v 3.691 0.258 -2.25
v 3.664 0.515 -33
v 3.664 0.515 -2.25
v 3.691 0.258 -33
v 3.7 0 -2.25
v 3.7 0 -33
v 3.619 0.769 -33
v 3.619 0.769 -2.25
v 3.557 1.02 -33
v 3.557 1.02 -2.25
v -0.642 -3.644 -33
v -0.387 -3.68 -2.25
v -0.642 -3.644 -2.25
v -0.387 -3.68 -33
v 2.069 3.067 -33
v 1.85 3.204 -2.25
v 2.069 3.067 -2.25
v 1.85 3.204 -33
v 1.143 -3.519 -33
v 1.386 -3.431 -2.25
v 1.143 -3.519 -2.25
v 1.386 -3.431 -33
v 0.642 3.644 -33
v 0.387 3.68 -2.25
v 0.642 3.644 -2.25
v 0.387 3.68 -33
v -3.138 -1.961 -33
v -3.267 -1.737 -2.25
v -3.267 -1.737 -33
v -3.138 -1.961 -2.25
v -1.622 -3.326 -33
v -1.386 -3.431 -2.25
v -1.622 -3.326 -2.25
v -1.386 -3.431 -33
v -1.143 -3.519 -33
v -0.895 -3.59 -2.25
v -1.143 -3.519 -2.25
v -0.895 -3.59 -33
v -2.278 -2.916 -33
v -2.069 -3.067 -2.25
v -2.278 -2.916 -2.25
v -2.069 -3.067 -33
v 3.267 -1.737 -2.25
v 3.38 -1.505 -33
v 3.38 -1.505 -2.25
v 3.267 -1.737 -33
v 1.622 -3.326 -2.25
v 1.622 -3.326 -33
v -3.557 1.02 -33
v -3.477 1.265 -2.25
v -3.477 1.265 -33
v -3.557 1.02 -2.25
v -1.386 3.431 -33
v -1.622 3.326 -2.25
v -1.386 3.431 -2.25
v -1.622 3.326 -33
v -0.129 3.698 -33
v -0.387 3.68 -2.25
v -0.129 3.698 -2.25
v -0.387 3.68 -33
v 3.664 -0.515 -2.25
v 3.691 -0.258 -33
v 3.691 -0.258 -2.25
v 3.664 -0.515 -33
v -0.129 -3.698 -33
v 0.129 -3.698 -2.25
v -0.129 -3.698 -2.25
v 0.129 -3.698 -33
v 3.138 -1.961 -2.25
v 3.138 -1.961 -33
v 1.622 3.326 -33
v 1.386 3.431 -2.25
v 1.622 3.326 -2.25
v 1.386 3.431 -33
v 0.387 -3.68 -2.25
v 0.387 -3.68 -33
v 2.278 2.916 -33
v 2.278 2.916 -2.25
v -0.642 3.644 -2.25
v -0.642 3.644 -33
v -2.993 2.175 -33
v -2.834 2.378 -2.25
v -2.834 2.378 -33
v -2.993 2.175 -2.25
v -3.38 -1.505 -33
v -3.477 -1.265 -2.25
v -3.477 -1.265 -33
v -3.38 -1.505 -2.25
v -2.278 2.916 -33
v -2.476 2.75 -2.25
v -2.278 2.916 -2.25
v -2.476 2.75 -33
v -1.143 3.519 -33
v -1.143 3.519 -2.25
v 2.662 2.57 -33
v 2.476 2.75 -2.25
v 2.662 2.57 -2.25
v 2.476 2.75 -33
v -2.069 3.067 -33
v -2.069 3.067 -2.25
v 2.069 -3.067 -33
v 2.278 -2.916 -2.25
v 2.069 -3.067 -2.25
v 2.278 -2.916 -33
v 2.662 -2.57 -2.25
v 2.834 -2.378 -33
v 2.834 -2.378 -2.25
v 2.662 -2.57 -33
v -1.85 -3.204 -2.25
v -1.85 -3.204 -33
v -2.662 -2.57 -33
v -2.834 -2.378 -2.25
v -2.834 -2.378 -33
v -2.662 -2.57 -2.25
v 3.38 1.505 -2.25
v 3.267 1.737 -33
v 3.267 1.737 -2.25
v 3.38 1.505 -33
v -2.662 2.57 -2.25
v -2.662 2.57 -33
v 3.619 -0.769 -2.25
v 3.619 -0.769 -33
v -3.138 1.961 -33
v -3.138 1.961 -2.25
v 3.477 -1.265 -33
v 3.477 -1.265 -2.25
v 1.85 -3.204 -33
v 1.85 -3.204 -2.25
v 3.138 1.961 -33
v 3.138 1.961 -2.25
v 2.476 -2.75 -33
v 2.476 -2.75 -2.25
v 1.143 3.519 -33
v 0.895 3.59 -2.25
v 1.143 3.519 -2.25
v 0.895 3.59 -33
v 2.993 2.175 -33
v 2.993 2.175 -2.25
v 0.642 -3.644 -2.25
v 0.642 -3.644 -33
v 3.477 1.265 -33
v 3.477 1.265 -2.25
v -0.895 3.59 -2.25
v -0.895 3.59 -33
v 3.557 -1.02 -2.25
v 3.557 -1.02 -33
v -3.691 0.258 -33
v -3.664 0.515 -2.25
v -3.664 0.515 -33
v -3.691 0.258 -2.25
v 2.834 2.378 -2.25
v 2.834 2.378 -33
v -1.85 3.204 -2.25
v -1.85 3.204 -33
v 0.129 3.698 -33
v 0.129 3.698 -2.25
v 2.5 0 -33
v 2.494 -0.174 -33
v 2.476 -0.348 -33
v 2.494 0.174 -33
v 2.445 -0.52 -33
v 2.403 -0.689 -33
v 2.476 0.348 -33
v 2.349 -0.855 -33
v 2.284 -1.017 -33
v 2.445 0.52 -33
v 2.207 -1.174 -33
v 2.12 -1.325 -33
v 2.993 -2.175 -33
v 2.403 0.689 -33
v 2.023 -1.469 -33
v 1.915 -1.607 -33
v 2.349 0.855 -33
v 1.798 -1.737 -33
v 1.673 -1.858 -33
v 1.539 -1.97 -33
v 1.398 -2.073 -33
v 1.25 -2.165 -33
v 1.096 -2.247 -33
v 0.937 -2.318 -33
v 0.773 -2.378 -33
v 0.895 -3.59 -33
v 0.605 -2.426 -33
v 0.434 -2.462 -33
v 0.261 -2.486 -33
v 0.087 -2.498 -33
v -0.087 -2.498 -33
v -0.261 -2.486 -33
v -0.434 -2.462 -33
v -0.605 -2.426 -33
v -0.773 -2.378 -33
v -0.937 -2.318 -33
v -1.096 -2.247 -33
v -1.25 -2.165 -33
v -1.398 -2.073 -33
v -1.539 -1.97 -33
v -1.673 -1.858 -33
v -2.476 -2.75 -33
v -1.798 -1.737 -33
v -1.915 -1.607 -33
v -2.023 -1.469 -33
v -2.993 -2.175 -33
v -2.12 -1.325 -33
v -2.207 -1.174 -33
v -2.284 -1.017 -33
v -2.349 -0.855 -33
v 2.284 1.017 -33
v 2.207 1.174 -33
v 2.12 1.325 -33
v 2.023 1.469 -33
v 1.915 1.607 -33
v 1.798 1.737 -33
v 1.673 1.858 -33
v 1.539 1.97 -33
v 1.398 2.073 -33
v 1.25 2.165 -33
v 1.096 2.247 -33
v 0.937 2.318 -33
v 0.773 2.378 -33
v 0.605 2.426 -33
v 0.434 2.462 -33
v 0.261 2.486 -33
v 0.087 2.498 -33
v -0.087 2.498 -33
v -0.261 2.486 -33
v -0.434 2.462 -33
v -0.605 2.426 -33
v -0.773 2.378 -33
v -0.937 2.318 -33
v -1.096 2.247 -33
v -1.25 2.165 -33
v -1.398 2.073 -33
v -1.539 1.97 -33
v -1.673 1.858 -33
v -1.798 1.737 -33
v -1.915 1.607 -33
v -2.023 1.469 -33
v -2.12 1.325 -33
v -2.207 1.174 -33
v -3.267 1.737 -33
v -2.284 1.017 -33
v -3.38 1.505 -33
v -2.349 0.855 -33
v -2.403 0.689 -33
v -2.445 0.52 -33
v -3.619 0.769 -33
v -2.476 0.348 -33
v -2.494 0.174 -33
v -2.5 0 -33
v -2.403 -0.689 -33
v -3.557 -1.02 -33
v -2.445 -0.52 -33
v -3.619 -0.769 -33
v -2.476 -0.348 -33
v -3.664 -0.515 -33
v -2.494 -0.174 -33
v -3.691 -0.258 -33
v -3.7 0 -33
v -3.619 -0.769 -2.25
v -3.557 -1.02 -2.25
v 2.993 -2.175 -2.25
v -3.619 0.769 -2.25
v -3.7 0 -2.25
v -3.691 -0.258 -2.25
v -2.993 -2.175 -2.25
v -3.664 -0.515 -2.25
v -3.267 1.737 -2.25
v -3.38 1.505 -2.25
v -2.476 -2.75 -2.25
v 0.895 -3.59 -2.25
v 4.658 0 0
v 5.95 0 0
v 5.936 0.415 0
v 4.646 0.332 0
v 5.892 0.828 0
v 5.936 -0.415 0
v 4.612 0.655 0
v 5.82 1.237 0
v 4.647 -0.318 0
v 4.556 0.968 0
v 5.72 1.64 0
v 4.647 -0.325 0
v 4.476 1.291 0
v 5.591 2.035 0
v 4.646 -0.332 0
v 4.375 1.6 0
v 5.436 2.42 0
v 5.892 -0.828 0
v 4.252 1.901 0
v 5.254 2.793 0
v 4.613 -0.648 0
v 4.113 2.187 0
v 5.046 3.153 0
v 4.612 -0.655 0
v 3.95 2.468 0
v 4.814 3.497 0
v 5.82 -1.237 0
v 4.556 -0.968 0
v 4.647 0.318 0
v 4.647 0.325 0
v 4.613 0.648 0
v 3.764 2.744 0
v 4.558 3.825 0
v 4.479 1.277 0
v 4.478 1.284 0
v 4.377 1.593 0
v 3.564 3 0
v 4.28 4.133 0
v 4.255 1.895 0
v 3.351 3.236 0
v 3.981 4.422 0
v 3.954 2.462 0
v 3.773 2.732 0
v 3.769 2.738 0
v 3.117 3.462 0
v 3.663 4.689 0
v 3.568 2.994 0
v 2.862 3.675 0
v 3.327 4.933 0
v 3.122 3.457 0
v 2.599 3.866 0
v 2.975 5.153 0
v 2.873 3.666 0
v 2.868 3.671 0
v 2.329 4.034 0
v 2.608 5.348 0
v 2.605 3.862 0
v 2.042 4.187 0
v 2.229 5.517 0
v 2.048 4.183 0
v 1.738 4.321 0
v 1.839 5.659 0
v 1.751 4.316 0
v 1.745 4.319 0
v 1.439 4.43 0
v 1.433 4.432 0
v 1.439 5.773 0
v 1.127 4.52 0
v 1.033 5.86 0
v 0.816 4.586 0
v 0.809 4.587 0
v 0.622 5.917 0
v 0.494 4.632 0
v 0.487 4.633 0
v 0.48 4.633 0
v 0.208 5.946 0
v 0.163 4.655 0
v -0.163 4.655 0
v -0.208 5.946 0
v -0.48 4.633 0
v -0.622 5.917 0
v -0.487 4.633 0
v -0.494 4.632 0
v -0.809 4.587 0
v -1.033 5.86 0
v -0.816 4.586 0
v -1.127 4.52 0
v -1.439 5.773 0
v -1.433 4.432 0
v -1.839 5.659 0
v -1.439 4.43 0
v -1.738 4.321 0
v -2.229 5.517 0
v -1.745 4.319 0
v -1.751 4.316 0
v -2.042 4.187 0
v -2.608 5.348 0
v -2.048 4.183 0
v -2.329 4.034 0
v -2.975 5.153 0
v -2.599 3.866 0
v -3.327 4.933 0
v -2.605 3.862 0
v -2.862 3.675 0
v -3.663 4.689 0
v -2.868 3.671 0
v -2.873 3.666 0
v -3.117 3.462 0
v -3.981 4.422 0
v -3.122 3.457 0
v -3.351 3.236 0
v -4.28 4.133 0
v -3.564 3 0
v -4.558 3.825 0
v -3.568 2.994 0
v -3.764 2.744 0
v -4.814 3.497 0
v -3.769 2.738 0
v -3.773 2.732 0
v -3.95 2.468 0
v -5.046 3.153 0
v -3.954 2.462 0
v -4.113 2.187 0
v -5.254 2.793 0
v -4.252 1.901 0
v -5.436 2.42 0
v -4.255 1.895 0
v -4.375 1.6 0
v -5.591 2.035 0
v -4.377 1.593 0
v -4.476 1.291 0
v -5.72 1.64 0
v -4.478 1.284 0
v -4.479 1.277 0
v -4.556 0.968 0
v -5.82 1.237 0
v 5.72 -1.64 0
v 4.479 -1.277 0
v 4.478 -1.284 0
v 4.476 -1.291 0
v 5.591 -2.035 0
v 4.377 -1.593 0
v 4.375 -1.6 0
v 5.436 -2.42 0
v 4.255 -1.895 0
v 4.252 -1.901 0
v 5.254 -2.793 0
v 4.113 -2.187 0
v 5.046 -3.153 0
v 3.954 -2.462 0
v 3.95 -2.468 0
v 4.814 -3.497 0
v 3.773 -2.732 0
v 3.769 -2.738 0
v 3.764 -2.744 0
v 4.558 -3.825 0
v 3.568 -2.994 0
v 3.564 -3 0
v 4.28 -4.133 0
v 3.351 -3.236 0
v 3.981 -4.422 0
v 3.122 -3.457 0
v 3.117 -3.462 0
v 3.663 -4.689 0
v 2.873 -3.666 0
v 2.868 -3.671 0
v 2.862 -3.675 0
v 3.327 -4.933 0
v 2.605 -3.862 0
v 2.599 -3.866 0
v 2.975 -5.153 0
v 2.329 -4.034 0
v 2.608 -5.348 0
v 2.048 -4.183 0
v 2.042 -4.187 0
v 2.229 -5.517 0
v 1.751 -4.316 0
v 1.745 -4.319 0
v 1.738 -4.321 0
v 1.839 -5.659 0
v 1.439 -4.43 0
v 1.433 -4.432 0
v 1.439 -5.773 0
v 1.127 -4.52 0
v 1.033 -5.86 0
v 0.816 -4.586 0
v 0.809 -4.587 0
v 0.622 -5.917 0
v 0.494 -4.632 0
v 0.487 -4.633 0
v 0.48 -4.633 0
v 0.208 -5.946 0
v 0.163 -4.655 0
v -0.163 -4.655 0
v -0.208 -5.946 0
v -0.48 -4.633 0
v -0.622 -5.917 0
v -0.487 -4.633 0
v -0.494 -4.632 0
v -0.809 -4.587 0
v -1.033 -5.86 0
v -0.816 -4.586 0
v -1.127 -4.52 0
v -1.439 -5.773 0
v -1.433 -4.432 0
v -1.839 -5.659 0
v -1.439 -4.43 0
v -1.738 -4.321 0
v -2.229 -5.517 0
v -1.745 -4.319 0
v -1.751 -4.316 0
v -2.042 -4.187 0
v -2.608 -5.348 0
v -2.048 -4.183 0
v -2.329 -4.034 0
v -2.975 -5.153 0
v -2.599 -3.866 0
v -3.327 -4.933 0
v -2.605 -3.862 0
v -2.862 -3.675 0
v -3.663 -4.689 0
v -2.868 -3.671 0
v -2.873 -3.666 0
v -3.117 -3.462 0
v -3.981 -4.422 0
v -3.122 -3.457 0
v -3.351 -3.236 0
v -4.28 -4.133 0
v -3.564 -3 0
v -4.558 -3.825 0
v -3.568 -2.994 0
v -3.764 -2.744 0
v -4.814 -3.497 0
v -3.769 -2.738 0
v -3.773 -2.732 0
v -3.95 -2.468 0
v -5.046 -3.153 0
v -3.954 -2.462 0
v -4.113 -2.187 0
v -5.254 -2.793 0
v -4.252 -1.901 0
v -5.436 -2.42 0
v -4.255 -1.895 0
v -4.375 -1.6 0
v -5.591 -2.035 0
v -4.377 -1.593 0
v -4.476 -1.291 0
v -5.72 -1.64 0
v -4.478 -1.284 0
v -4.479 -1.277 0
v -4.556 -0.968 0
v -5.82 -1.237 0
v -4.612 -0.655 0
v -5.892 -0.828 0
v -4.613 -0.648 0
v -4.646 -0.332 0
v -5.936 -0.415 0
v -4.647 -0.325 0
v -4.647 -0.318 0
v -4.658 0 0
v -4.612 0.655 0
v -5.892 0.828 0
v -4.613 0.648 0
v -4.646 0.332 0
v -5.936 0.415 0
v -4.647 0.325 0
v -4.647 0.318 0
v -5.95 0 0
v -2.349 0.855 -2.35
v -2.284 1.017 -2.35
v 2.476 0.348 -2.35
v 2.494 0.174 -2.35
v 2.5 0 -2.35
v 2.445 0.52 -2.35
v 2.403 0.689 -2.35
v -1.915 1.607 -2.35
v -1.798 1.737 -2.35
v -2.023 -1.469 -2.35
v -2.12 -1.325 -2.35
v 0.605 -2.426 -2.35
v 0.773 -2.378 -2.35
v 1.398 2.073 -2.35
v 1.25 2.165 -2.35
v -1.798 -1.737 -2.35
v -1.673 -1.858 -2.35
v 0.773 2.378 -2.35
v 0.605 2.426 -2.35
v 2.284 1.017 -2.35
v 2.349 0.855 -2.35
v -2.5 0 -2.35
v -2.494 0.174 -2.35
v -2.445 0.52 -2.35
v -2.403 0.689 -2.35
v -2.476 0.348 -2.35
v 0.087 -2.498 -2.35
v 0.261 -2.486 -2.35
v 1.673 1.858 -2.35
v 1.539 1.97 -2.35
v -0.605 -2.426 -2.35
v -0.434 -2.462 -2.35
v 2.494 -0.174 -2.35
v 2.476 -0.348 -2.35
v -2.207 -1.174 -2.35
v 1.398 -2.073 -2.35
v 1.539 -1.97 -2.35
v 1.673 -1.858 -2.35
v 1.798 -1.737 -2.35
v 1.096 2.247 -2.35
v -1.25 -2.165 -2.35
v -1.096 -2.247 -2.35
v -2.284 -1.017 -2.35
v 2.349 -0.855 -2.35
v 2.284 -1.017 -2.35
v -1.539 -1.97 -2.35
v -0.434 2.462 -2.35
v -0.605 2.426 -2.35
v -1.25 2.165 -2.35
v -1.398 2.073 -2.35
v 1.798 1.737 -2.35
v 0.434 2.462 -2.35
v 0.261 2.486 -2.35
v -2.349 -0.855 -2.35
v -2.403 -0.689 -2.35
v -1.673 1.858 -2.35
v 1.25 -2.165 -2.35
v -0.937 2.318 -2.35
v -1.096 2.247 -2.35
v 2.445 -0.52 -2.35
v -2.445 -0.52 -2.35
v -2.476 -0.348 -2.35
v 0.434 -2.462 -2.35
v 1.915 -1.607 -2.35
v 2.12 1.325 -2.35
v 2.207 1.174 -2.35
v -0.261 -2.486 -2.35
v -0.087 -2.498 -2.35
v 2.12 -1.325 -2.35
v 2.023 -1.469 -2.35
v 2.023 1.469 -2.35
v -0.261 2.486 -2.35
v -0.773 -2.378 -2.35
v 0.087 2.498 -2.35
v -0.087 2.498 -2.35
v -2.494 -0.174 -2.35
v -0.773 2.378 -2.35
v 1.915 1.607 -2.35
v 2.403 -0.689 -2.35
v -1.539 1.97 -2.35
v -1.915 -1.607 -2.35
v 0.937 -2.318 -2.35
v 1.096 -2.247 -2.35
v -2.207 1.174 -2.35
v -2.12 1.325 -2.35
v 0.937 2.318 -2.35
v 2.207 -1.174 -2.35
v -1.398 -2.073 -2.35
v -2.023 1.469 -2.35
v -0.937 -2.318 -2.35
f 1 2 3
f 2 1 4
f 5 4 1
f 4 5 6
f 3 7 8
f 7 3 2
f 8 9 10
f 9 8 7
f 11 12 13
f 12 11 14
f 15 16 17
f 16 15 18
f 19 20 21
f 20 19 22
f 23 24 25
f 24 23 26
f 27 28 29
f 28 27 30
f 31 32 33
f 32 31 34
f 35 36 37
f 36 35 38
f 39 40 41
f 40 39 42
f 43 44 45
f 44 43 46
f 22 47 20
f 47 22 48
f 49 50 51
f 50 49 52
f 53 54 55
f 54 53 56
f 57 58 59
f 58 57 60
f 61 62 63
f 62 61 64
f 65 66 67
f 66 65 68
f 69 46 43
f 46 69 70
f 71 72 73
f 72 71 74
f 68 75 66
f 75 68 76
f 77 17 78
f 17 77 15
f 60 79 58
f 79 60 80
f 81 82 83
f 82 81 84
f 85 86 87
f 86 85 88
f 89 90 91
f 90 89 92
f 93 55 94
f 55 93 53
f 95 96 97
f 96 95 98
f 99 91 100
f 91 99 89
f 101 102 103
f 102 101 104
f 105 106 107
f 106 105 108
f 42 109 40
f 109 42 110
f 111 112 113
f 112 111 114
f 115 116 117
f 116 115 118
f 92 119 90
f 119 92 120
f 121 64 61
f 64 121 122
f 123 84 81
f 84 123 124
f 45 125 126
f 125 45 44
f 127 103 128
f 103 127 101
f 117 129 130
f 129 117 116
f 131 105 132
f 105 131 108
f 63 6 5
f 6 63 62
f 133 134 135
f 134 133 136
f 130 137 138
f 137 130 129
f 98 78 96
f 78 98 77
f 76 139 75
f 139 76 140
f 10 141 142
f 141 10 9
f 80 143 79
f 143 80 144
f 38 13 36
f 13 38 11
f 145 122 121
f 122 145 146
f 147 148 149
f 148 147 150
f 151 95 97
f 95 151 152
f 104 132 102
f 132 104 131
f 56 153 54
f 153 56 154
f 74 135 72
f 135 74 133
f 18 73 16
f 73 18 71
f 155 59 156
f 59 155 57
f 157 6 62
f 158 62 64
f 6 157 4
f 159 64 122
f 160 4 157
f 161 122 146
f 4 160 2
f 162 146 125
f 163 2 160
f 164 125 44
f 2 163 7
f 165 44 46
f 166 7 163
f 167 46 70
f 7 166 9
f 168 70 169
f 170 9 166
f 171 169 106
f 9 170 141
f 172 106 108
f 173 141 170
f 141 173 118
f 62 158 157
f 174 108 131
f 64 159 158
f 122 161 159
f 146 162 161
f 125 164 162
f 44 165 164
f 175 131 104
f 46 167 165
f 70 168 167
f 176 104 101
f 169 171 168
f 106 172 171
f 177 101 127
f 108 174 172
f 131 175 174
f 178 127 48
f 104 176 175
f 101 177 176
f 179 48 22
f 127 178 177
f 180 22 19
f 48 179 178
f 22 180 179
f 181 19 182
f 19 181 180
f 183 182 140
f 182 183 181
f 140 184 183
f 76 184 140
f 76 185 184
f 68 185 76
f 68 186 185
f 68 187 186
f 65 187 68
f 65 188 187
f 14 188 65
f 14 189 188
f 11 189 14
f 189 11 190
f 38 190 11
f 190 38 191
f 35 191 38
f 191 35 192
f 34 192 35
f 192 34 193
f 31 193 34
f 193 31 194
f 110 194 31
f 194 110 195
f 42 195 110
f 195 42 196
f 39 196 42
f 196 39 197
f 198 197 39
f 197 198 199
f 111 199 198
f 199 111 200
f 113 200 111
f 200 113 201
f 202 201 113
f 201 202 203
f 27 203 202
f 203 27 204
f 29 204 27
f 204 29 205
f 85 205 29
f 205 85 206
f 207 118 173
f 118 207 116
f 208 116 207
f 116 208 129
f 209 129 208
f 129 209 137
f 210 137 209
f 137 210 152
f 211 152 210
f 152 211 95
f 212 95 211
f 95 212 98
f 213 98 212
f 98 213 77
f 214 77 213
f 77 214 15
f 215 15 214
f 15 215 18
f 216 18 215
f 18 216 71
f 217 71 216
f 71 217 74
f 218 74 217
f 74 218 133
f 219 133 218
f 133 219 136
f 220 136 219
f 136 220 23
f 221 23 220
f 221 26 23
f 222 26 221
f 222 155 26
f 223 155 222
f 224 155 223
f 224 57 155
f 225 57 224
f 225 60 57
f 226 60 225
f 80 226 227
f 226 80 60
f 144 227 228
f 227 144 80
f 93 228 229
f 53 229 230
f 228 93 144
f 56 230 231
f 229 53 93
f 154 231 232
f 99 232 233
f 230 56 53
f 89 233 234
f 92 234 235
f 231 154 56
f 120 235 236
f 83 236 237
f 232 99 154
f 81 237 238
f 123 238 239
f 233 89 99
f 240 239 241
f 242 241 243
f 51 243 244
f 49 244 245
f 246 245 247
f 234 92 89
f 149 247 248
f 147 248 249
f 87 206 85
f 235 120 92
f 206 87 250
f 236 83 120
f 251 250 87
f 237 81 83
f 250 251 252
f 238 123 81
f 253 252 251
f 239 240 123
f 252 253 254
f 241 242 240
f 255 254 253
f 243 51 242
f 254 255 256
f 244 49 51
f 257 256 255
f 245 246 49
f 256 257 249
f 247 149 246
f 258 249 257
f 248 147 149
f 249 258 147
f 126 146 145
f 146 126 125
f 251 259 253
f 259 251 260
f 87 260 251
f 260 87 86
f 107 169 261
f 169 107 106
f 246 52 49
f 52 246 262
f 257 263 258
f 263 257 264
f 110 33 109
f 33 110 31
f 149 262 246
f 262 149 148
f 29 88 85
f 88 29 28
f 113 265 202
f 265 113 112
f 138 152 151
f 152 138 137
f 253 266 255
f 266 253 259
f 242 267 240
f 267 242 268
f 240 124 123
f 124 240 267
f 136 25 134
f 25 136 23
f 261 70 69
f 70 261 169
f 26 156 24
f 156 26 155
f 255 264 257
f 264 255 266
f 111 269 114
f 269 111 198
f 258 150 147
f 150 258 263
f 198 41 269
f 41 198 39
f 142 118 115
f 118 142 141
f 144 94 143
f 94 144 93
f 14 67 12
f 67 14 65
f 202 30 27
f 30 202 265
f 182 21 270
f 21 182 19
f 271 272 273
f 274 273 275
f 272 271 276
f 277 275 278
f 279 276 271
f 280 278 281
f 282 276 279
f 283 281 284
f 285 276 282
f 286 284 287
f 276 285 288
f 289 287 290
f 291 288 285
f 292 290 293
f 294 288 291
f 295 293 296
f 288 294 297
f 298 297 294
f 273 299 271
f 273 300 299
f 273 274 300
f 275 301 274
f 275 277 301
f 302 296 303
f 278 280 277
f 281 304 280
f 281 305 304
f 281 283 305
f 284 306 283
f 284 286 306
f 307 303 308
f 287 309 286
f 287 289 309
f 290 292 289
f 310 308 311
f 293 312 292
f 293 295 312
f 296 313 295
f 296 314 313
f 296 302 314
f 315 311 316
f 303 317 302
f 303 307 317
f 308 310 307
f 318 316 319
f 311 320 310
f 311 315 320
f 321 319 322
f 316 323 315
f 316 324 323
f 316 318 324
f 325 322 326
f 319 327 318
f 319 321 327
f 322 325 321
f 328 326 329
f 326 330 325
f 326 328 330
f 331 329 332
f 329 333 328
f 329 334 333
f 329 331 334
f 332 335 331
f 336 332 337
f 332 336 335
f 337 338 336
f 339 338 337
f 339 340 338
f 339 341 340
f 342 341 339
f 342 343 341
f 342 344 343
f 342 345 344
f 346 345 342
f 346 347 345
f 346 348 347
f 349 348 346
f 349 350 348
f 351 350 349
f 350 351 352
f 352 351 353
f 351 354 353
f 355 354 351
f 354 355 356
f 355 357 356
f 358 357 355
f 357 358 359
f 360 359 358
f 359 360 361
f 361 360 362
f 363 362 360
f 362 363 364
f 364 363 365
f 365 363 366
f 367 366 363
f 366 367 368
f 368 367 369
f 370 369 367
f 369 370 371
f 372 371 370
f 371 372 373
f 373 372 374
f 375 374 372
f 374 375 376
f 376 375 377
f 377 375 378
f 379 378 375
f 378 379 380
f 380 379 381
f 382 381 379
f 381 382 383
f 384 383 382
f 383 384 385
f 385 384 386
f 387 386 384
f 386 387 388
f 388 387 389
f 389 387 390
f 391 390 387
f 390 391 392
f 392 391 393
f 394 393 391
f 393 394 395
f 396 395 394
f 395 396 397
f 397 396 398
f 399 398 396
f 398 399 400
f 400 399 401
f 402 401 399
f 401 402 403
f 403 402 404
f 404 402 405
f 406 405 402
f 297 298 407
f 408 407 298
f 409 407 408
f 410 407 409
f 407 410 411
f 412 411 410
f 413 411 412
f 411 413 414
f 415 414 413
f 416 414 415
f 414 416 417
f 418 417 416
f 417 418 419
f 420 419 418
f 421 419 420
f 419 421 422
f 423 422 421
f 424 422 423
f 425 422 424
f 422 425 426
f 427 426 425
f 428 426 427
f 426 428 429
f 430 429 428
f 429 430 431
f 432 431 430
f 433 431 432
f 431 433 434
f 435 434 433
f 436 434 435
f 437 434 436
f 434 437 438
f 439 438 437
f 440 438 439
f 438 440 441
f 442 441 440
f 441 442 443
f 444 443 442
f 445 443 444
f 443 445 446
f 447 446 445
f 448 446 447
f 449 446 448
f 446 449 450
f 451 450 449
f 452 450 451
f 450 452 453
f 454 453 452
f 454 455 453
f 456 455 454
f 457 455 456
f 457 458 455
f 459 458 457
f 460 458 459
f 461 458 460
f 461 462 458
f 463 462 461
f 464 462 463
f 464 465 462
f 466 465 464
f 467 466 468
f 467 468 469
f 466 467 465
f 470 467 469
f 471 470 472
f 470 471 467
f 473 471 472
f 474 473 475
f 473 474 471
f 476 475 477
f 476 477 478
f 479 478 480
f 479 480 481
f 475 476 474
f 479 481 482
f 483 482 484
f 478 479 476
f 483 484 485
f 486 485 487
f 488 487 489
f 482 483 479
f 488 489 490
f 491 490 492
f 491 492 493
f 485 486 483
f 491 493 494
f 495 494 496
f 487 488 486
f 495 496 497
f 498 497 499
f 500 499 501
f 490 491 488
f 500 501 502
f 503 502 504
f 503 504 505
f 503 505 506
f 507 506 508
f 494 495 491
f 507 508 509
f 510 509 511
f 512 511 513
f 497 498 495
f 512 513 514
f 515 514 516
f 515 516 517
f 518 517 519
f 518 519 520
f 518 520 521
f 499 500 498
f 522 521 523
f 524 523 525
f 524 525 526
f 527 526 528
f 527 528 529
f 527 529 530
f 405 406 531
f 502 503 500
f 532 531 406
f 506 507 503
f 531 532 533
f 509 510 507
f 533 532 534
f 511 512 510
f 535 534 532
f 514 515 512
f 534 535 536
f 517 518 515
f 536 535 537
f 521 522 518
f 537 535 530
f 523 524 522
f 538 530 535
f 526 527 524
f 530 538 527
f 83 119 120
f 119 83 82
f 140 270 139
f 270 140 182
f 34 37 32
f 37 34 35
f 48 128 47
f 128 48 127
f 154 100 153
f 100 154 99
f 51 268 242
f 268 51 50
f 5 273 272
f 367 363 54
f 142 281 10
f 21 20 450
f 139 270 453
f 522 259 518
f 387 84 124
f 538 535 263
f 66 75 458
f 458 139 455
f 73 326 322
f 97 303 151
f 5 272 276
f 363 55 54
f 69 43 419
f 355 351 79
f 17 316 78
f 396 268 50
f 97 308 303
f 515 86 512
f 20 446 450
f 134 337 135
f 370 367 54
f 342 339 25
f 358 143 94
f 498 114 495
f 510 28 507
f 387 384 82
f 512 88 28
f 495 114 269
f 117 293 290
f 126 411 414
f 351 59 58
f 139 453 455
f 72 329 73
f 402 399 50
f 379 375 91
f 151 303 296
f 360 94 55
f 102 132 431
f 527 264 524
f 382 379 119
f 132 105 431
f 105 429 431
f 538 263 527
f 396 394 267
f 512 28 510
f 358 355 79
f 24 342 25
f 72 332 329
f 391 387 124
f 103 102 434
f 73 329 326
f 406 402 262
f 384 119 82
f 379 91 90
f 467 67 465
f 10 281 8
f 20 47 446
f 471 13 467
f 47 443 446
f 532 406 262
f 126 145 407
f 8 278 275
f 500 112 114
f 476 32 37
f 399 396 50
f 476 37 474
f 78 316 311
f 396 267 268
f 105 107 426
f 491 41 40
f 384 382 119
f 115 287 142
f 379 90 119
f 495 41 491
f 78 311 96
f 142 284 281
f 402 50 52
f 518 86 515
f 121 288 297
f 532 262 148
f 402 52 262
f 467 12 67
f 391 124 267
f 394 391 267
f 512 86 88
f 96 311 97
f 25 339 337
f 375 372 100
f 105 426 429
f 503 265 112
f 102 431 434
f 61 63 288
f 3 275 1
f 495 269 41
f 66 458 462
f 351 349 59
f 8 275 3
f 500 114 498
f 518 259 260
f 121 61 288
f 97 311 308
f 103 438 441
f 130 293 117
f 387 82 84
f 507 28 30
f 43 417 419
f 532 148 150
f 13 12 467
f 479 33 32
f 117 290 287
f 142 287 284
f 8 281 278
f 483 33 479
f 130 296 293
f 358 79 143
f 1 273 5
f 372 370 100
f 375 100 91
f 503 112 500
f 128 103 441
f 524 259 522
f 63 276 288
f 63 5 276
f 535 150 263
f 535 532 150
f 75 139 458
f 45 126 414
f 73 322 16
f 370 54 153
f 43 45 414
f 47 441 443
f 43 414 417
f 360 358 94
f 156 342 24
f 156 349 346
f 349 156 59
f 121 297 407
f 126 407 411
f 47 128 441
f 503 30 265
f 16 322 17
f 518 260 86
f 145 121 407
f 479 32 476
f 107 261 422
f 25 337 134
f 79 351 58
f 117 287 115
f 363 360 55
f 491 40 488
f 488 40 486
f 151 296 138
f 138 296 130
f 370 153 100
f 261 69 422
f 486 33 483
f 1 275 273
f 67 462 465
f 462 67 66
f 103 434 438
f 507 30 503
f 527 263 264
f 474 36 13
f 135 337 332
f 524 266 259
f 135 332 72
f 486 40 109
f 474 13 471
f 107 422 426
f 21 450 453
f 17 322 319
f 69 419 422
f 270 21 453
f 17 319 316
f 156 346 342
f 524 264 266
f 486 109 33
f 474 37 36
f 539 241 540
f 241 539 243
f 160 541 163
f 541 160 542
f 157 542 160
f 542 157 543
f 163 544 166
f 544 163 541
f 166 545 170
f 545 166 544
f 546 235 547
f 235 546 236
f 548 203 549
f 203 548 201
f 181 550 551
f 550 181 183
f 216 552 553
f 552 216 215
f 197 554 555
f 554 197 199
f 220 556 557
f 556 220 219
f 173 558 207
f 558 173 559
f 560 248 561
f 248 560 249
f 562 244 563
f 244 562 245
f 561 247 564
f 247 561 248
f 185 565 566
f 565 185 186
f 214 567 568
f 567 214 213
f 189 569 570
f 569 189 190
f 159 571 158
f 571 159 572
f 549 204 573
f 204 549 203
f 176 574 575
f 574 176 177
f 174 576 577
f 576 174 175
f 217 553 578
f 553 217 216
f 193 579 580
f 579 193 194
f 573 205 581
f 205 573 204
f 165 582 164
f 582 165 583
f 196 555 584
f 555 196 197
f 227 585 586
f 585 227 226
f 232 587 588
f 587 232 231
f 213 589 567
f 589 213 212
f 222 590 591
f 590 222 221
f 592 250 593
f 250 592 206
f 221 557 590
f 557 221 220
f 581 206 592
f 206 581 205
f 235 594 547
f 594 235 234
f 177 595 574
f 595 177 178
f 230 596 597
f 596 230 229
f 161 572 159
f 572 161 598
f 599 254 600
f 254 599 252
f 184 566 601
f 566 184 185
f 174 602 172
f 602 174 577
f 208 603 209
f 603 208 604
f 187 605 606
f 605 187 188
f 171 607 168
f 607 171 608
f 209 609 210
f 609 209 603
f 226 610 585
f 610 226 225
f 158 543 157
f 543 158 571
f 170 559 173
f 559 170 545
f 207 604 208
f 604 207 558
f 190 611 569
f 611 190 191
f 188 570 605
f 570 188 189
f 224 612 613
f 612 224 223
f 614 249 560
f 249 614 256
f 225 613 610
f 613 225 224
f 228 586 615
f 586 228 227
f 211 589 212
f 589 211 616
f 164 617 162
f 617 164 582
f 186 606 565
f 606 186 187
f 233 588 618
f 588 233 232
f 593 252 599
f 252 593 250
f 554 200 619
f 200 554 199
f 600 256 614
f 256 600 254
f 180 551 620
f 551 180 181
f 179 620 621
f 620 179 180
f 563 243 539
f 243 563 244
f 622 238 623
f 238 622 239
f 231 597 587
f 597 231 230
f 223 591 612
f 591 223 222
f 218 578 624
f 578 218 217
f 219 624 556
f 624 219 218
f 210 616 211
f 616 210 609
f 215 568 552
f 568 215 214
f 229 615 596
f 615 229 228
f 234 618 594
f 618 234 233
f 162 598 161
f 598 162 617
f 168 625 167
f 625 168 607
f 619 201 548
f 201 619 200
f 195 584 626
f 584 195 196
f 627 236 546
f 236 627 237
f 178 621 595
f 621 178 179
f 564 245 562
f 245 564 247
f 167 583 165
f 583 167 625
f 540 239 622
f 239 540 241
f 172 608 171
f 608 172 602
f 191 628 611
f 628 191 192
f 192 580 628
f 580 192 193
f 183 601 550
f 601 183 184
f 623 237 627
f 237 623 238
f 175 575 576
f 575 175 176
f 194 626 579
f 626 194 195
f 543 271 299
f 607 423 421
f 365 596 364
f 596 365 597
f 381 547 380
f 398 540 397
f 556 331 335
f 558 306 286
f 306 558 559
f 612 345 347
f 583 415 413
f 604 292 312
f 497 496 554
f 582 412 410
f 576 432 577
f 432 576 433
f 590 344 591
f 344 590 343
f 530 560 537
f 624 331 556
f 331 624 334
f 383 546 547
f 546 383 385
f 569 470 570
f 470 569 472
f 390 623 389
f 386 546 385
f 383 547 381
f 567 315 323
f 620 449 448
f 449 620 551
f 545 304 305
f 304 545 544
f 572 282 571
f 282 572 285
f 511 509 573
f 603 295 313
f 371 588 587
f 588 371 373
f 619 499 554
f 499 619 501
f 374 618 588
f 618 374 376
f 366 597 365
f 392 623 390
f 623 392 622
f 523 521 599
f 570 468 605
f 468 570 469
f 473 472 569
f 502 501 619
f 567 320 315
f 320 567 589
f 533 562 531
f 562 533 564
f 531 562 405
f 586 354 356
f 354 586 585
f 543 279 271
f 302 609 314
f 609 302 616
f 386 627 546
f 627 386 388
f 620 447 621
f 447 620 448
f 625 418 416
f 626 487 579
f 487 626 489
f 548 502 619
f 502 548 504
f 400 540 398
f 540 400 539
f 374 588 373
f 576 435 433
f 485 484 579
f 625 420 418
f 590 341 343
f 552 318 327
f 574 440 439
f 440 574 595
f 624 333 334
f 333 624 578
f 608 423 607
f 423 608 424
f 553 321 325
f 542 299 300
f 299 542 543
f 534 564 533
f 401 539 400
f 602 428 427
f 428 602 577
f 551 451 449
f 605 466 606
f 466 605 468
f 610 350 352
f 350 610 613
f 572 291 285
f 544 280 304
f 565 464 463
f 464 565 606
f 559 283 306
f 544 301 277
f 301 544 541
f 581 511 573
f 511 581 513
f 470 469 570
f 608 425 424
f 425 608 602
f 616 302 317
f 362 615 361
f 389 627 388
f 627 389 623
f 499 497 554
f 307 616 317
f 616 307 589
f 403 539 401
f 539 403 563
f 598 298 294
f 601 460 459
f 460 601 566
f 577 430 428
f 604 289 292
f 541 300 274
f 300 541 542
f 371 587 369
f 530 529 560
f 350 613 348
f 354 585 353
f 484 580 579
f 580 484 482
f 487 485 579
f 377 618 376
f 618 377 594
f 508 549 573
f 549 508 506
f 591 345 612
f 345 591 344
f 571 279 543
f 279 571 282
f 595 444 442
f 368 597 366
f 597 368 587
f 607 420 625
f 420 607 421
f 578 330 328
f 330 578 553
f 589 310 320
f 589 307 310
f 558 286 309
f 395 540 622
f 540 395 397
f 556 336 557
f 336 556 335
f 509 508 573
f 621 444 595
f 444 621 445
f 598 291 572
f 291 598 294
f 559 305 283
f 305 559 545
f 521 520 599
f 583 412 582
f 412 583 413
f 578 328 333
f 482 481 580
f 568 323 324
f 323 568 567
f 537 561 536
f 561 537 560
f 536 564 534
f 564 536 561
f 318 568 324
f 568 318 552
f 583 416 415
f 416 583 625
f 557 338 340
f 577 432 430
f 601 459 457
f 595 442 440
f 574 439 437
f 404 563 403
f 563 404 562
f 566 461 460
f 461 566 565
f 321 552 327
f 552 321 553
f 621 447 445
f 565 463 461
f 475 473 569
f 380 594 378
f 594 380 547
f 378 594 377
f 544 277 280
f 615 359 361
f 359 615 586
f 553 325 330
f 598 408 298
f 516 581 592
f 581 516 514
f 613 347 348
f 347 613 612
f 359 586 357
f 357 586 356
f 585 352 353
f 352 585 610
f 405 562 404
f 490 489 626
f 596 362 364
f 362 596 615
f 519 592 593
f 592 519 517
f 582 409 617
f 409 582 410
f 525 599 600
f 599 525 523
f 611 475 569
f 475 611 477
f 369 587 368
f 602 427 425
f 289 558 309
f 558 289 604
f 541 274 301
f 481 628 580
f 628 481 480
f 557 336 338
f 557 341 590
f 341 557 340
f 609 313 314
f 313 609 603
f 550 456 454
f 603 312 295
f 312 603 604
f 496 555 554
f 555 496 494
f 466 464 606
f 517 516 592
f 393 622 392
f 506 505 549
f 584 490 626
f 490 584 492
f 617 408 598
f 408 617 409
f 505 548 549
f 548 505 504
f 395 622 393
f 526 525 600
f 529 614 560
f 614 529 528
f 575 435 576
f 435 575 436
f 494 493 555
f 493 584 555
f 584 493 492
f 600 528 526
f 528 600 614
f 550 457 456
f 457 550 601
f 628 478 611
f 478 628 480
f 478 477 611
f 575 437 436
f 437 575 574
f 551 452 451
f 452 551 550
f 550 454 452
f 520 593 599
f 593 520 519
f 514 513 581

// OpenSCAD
screw=5;
screw_head=9.5;
screw_head_h=(screw_head-screw)/2;
filament=1.2;
wall=filament*2;

body=screw+wall*2;

head_d=4;
head_r=head_d/2;

height=33;

$fn=90;
pad=0.1;
padd=pad*2;

mirror([0,0,1])
difference() {
    union() {
        cylinder(h=height,d=screw+wall);
        cylinder(h=screw_head_h,d2=screw+wall,d1=screw_head+wall);
    }
    translate([0,0,-pad])
    cylinder(h=height+padd,d=screw);
    translate([0,0,-pad])
    cylinder(h=screw_head_h+padd,d2=screw,d1=screw_head);
}
